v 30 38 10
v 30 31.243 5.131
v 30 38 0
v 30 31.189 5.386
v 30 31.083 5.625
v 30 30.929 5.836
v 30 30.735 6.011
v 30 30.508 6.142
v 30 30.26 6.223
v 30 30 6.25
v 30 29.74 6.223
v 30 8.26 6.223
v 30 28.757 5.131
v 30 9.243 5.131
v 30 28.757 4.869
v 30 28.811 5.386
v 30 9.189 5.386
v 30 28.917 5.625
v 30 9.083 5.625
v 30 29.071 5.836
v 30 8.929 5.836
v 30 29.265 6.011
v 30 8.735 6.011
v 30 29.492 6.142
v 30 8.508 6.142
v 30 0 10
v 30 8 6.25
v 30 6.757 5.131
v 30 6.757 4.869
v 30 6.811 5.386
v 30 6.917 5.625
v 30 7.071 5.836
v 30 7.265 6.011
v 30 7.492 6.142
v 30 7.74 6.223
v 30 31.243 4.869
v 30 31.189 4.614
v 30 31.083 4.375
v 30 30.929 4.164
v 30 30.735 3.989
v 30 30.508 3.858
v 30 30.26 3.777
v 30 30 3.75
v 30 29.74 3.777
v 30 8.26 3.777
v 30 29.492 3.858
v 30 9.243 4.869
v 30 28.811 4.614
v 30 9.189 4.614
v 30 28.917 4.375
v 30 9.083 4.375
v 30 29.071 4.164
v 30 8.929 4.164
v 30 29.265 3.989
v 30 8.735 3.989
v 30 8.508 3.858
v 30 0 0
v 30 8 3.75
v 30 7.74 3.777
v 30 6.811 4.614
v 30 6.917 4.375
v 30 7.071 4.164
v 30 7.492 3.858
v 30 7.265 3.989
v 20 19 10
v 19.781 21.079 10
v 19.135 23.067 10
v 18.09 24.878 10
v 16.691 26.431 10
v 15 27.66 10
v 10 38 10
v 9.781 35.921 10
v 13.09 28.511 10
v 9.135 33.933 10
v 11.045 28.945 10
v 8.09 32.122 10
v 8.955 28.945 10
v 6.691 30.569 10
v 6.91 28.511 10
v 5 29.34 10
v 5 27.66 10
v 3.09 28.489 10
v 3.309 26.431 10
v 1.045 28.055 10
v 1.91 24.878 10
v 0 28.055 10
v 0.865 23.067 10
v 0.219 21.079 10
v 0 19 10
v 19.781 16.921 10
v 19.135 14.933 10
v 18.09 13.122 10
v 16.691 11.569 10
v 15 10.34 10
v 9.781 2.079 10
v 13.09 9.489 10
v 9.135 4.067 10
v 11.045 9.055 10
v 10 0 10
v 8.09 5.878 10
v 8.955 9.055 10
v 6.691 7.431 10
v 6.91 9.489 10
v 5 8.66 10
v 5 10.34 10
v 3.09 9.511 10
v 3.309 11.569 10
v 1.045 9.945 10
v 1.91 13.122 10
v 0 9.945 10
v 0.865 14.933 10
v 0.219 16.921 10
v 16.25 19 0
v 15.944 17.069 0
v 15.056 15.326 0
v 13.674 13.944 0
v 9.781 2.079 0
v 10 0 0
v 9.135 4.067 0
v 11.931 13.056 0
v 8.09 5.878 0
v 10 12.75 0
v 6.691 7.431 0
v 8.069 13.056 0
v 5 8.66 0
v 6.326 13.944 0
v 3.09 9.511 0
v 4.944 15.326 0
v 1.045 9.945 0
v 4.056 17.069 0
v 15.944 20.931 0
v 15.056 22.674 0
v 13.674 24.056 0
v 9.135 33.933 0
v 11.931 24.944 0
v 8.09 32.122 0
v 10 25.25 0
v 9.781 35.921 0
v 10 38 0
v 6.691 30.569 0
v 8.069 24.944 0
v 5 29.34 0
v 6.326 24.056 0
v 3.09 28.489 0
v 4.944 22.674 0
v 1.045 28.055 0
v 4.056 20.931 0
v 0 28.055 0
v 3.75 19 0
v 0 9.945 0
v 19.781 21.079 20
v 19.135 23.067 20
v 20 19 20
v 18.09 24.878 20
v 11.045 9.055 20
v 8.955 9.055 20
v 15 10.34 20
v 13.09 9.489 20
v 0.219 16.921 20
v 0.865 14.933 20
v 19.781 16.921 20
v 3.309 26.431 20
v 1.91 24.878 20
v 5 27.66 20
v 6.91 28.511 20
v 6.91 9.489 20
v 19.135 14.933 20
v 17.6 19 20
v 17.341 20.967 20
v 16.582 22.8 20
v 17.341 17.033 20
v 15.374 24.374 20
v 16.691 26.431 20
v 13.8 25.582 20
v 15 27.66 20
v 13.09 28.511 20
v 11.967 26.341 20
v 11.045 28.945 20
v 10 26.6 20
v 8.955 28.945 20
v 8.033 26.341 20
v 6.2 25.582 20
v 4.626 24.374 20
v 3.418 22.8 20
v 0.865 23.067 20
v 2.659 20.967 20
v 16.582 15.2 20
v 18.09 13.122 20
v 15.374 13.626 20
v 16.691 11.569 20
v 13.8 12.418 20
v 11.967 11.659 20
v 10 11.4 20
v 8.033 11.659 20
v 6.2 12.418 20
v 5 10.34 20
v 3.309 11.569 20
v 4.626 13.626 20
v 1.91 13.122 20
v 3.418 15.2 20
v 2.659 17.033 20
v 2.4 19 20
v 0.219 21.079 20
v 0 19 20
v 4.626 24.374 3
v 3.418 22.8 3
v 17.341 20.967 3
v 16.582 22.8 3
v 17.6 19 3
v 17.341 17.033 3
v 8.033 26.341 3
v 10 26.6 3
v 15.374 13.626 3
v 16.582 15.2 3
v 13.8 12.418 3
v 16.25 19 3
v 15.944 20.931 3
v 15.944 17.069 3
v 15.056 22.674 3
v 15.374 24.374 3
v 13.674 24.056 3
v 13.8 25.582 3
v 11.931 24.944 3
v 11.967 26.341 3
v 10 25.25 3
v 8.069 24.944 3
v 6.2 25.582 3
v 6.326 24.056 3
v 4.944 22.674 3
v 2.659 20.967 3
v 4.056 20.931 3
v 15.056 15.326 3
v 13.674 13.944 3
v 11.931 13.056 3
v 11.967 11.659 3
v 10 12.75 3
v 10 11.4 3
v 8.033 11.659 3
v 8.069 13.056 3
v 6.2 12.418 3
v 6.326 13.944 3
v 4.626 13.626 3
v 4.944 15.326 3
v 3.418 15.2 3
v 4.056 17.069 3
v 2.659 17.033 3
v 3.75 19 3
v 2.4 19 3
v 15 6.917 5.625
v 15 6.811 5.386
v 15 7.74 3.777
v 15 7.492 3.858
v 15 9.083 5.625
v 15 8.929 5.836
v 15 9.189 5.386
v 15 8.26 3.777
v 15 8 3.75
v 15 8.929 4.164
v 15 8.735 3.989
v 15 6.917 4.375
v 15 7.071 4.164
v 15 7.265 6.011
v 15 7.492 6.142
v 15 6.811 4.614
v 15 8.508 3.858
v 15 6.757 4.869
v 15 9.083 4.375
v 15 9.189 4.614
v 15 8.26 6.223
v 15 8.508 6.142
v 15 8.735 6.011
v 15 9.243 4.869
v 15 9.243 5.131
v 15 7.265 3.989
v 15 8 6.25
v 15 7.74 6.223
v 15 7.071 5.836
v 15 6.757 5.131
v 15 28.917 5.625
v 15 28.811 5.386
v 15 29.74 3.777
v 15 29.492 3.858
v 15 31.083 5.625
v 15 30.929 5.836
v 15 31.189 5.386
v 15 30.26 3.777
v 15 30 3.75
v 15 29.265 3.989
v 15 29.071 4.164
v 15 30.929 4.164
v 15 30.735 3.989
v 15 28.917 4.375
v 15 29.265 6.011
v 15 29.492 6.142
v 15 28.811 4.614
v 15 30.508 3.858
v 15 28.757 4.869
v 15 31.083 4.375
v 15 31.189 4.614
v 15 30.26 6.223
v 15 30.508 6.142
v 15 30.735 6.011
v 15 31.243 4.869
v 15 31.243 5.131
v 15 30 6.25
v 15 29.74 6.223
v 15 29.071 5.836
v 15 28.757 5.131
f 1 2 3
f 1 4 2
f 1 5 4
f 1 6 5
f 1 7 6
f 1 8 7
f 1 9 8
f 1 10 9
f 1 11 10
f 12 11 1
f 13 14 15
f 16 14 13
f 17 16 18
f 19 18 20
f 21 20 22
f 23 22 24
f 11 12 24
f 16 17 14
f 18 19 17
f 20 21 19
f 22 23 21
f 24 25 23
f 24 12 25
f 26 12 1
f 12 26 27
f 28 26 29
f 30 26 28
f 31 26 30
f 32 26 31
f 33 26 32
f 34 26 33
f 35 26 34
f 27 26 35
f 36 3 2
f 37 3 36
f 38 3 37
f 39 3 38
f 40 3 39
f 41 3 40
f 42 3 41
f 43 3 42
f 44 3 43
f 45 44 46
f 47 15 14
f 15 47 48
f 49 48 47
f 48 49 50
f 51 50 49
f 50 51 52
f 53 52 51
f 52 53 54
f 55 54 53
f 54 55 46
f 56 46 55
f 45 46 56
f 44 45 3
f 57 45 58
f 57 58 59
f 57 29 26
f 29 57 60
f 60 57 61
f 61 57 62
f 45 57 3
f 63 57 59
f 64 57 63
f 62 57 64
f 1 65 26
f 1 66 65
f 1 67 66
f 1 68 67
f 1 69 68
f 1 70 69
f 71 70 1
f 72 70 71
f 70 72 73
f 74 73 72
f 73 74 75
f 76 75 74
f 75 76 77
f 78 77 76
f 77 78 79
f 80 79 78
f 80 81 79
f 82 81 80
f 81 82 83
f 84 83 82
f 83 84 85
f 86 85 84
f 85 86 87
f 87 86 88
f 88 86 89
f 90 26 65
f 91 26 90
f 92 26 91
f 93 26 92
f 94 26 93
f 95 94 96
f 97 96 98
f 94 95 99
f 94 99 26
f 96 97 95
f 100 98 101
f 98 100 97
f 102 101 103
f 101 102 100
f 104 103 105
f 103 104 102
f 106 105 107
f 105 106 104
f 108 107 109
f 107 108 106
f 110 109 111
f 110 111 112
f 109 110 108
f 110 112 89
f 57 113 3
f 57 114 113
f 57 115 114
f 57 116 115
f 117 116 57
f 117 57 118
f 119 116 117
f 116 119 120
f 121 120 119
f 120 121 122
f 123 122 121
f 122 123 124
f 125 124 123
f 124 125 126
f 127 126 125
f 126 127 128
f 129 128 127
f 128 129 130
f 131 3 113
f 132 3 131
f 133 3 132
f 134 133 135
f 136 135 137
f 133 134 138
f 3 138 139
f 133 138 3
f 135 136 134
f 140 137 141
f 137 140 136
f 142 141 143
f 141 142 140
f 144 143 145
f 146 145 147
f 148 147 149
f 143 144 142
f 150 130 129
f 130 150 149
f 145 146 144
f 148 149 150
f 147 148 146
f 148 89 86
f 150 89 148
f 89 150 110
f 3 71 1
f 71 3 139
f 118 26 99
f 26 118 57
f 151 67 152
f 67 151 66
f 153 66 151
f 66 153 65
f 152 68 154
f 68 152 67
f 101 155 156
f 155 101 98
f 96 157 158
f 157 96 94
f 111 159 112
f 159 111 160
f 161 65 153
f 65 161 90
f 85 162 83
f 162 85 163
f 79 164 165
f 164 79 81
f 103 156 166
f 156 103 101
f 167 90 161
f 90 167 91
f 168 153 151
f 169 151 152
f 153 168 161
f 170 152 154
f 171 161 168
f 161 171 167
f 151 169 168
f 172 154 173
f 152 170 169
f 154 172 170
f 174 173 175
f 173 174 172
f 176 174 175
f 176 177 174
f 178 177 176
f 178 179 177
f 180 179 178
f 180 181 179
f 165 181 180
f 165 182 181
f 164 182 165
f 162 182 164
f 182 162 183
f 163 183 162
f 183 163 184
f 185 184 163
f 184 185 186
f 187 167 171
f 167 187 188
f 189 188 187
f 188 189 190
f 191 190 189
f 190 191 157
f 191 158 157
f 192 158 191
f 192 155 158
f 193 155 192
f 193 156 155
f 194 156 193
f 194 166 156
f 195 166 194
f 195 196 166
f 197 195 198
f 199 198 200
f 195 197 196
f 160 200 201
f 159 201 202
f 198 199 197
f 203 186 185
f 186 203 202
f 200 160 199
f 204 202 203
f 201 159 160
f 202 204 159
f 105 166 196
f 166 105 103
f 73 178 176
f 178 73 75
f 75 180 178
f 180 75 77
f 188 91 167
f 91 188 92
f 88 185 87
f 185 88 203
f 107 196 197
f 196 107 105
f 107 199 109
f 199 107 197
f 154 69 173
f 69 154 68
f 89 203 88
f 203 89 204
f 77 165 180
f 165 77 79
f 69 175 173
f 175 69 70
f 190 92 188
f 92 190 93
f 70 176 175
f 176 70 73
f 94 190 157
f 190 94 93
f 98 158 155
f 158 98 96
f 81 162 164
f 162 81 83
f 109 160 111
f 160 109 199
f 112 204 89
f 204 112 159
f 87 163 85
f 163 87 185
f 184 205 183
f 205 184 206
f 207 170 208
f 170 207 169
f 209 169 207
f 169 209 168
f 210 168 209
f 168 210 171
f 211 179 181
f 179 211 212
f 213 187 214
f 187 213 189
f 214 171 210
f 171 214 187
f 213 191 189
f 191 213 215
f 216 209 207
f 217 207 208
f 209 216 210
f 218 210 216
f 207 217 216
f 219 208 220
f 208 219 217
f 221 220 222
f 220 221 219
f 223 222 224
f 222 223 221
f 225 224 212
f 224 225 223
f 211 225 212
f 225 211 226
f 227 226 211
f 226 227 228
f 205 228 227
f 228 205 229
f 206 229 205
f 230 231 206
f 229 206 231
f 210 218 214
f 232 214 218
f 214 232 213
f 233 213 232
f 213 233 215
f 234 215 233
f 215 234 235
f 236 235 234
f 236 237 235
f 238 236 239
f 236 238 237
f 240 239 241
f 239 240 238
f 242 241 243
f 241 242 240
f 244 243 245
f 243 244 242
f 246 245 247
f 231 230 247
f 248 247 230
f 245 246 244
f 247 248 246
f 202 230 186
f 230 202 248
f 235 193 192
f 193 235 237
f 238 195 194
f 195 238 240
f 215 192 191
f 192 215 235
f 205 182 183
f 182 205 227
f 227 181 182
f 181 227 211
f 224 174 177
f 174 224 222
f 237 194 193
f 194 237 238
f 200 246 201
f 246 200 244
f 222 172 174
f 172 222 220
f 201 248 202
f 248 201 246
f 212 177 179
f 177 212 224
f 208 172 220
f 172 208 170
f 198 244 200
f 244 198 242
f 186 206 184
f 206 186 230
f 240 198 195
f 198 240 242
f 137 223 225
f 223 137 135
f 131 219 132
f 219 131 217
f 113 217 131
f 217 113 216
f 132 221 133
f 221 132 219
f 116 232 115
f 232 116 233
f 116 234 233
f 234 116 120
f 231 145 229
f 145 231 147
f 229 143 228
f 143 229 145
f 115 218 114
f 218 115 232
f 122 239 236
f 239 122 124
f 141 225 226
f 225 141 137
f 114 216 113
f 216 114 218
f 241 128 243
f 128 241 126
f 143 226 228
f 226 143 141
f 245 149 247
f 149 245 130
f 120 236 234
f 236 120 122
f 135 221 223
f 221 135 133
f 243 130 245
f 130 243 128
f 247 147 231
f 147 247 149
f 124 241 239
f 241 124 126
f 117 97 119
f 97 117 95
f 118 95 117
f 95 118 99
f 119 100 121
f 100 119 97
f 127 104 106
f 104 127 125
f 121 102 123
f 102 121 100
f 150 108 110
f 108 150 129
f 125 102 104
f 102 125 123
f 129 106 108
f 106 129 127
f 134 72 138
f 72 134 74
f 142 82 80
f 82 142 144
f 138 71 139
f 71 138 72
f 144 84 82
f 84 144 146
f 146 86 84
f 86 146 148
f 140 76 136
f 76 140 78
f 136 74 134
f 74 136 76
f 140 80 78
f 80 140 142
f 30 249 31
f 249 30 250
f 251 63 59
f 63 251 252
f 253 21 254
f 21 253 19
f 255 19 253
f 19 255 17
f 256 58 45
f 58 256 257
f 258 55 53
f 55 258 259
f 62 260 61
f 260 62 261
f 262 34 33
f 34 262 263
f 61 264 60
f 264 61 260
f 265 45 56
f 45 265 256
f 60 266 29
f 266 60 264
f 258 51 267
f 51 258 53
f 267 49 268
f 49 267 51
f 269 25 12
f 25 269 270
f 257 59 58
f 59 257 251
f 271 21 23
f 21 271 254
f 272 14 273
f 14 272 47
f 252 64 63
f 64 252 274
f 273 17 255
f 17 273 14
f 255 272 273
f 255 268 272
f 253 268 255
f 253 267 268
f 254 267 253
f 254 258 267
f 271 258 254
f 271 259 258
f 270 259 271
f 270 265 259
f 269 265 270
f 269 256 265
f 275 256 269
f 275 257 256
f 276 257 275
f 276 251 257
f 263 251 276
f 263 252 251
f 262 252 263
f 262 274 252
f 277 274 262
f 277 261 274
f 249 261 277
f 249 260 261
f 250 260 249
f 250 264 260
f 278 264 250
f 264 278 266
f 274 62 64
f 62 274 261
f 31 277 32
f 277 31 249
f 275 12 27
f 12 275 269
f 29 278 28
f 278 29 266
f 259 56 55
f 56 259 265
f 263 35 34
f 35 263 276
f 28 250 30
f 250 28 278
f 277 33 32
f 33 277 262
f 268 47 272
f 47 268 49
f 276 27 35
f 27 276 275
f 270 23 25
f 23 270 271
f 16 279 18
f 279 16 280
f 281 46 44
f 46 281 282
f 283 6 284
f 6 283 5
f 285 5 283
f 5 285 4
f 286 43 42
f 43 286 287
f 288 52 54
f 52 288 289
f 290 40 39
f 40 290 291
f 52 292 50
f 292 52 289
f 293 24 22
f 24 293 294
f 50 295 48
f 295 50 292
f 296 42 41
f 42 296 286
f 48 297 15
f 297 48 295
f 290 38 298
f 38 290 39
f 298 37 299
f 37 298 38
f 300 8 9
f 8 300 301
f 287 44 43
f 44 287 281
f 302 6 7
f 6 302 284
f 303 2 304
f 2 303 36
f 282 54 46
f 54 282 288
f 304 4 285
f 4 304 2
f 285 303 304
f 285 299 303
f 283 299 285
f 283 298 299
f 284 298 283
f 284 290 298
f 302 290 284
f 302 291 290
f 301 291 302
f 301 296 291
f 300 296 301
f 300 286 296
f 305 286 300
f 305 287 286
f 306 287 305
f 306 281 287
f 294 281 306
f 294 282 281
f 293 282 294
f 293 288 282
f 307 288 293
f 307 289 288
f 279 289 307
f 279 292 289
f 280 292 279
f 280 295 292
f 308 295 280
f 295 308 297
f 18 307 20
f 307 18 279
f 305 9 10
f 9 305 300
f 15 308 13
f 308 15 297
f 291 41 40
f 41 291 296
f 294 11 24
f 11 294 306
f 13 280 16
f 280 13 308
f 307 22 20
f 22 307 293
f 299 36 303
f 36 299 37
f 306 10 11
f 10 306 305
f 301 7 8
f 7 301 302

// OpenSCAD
difference() {
    union() {
        cube ([30,38,10]);
        translate ([20/2,38/2,0]){
            cylinder (h = 20, d = 20);
        }
    }

    translate([(15.2/2) + ((20-15.2)/2), 38/2, 3]) {
        cylinder(h=17, d = 15.2);
    }
    
    translate([(12.5/2) + ((20-12.5)/2), 38/2, 0]) {
        cylinder(h=4, d = 12.5);
    }
    
    cylinder(h=10, d=20);
    
    translate([0,38,0]) {
        cylinder(h=10, d=20);
    }

    translate([15,8,5]) {
        rotate(a=[0,90,0]){
            cylinder(h=15, d=2.5, $fn=30);
        }
    }

    translate([15,30,5]) {
        rotate(a=[0,90,0]){
            cylinder(h=15, d=2.5, $fn=30);
        }
    }   
}
